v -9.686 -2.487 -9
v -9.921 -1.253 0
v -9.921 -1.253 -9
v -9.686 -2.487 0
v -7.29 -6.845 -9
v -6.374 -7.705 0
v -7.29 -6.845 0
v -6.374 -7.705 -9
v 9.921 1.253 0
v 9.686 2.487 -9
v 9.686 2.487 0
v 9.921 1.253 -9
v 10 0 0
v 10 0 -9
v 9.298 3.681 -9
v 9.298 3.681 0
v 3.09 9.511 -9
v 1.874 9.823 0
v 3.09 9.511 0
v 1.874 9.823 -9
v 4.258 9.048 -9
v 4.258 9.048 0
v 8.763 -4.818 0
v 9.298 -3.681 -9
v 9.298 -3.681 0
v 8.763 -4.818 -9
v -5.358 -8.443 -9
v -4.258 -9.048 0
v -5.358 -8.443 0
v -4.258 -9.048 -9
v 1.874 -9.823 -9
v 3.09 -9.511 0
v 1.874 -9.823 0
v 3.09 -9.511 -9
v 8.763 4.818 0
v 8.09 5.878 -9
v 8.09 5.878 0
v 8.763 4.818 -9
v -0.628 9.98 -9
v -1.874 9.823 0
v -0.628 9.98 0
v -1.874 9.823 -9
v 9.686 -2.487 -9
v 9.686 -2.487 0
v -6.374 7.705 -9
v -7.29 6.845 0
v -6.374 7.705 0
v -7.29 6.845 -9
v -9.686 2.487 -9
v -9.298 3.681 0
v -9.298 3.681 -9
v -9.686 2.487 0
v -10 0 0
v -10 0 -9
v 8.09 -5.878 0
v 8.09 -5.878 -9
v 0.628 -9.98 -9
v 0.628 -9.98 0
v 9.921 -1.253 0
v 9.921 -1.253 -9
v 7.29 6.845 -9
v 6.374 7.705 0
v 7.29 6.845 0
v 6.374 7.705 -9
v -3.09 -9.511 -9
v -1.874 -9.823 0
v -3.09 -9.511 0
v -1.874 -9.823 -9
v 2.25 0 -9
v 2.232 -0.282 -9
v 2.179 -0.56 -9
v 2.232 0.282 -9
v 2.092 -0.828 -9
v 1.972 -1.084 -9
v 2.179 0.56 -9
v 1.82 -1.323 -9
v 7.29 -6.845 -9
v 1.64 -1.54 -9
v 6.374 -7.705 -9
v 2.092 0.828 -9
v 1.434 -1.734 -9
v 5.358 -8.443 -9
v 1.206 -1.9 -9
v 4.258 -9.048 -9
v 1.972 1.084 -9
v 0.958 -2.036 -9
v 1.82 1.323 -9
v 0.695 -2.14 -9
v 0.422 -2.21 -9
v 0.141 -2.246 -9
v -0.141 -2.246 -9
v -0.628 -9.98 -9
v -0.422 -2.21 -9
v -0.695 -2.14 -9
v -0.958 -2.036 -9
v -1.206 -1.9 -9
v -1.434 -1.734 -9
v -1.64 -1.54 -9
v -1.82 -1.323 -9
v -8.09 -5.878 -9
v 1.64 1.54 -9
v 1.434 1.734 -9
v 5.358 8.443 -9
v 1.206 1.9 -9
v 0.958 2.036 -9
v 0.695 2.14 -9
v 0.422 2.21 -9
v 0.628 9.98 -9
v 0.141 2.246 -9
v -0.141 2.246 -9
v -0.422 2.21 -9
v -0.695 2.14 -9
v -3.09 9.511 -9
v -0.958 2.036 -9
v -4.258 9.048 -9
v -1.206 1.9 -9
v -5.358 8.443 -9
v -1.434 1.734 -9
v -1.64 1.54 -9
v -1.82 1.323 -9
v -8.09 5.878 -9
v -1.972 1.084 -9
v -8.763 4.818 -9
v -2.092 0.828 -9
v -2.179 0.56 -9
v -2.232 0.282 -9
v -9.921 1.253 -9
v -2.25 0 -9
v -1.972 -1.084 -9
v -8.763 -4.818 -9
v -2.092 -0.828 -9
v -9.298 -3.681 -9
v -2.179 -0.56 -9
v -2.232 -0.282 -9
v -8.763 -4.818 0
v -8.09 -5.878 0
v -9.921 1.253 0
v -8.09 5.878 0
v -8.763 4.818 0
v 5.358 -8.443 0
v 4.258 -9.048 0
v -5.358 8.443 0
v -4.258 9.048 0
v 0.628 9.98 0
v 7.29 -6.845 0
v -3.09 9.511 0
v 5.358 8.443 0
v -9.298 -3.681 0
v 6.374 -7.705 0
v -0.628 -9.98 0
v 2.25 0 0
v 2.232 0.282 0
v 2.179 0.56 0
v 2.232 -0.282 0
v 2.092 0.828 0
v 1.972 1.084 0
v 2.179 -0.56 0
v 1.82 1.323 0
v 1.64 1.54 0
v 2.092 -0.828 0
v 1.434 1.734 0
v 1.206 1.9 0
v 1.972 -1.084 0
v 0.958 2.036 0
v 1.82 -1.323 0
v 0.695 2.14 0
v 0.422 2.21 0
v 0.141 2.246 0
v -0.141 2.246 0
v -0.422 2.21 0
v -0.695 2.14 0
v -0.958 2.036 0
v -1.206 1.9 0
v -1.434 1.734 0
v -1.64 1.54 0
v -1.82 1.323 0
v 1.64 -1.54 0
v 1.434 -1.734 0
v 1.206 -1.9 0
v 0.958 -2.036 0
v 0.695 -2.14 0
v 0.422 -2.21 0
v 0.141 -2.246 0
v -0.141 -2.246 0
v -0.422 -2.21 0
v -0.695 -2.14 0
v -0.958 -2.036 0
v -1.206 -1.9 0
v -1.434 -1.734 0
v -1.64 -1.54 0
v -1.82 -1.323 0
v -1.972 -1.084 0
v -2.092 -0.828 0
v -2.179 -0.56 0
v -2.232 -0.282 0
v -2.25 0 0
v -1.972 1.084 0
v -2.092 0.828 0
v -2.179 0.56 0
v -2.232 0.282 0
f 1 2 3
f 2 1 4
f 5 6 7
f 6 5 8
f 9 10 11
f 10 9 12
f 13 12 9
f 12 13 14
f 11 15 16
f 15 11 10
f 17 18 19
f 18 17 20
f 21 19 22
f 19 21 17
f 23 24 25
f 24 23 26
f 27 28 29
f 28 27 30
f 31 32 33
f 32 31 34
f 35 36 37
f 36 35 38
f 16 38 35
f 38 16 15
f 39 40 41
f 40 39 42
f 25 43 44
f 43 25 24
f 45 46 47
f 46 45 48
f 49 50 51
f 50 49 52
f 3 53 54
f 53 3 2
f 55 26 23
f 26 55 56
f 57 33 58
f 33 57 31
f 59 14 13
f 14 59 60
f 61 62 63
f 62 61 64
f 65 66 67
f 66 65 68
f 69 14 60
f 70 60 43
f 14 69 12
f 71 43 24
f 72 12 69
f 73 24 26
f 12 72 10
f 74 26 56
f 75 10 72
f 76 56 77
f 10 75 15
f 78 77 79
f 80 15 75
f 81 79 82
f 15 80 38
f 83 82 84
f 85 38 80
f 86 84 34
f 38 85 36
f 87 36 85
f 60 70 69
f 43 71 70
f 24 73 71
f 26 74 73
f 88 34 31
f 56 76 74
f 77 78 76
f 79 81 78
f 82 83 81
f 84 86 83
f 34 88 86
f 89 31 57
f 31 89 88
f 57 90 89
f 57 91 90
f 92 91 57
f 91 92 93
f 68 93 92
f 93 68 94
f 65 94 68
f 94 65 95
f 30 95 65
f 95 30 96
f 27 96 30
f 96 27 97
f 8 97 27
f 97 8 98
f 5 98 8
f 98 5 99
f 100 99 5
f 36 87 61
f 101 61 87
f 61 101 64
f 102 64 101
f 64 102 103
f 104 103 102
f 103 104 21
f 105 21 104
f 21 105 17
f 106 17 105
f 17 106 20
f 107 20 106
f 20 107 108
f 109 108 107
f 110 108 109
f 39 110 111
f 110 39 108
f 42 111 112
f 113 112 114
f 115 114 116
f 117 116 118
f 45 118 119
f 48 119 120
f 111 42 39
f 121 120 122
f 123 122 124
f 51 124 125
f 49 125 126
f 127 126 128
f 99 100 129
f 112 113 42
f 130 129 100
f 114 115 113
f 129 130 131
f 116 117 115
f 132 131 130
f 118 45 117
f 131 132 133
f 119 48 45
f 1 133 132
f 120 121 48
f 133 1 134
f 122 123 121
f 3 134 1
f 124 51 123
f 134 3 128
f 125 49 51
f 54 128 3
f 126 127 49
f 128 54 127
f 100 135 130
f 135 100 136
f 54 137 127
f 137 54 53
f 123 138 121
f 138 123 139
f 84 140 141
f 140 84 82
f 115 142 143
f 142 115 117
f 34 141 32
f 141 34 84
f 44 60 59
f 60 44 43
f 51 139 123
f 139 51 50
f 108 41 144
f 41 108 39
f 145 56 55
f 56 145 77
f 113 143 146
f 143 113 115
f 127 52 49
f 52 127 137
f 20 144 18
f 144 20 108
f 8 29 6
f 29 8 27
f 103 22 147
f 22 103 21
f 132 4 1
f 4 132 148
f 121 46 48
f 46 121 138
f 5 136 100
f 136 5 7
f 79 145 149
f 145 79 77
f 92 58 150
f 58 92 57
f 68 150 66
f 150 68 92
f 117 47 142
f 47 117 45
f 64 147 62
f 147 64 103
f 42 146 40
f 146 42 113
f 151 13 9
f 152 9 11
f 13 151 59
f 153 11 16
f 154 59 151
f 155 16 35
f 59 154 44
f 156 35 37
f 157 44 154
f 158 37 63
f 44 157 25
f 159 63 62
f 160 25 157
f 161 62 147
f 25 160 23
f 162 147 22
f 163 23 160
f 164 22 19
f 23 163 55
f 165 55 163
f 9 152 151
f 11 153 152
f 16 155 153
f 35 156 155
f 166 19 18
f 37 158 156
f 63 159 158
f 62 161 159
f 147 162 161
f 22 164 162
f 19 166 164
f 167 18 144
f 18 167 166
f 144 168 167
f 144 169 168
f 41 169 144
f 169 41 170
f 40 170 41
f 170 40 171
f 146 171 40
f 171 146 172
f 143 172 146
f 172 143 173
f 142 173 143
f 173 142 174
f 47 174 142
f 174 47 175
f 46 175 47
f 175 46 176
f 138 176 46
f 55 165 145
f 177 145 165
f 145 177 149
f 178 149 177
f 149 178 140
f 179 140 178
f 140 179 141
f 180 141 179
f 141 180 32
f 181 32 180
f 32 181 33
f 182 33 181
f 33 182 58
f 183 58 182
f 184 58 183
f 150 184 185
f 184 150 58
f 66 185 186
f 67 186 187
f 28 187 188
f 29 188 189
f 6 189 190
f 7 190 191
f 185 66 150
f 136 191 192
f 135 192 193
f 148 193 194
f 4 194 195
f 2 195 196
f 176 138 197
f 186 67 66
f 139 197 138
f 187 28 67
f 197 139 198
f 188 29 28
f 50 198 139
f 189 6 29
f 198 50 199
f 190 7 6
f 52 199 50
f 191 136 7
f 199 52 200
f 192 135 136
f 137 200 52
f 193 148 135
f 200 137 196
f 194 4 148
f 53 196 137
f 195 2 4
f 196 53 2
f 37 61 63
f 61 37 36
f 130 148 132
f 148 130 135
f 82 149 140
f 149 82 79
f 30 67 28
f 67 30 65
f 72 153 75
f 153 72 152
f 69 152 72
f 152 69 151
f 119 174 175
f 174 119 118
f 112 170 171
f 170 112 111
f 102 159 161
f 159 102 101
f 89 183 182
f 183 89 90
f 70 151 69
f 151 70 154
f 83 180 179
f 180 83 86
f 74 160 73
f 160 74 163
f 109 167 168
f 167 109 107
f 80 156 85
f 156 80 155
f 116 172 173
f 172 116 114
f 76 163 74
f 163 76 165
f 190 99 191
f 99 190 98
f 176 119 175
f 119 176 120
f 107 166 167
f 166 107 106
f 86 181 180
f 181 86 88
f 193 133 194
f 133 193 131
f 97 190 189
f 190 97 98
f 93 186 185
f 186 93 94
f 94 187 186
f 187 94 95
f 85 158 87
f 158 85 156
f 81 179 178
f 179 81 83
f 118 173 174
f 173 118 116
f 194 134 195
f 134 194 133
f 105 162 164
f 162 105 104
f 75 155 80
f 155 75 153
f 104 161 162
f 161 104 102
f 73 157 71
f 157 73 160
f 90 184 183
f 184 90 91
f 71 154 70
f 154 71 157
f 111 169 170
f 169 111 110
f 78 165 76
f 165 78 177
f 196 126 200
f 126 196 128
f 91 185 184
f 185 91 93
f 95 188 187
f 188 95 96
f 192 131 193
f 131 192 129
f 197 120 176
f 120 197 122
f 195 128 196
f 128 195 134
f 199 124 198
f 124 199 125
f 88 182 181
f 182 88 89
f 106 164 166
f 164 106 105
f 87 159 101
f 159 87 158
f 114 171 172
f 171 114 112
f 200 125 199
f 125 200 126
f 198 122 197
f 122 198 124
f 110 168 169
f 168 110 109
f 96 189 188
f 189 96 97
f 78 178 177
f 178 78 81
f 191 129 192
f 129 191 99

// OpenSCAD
$fn = 50;


difference() {
	union() {
		translate(v = [0, 0, -9.0000000000]) {
			cylinder(h = 9, r = 10.0000000000);
		}
		cylinder(h = 0, r = 20.0000000000);
	}
	union() {
		#translate(v = [0, 0, -9]) {
			cylinder(h = 9, r = 2.2500000000);
		}
	}
}
